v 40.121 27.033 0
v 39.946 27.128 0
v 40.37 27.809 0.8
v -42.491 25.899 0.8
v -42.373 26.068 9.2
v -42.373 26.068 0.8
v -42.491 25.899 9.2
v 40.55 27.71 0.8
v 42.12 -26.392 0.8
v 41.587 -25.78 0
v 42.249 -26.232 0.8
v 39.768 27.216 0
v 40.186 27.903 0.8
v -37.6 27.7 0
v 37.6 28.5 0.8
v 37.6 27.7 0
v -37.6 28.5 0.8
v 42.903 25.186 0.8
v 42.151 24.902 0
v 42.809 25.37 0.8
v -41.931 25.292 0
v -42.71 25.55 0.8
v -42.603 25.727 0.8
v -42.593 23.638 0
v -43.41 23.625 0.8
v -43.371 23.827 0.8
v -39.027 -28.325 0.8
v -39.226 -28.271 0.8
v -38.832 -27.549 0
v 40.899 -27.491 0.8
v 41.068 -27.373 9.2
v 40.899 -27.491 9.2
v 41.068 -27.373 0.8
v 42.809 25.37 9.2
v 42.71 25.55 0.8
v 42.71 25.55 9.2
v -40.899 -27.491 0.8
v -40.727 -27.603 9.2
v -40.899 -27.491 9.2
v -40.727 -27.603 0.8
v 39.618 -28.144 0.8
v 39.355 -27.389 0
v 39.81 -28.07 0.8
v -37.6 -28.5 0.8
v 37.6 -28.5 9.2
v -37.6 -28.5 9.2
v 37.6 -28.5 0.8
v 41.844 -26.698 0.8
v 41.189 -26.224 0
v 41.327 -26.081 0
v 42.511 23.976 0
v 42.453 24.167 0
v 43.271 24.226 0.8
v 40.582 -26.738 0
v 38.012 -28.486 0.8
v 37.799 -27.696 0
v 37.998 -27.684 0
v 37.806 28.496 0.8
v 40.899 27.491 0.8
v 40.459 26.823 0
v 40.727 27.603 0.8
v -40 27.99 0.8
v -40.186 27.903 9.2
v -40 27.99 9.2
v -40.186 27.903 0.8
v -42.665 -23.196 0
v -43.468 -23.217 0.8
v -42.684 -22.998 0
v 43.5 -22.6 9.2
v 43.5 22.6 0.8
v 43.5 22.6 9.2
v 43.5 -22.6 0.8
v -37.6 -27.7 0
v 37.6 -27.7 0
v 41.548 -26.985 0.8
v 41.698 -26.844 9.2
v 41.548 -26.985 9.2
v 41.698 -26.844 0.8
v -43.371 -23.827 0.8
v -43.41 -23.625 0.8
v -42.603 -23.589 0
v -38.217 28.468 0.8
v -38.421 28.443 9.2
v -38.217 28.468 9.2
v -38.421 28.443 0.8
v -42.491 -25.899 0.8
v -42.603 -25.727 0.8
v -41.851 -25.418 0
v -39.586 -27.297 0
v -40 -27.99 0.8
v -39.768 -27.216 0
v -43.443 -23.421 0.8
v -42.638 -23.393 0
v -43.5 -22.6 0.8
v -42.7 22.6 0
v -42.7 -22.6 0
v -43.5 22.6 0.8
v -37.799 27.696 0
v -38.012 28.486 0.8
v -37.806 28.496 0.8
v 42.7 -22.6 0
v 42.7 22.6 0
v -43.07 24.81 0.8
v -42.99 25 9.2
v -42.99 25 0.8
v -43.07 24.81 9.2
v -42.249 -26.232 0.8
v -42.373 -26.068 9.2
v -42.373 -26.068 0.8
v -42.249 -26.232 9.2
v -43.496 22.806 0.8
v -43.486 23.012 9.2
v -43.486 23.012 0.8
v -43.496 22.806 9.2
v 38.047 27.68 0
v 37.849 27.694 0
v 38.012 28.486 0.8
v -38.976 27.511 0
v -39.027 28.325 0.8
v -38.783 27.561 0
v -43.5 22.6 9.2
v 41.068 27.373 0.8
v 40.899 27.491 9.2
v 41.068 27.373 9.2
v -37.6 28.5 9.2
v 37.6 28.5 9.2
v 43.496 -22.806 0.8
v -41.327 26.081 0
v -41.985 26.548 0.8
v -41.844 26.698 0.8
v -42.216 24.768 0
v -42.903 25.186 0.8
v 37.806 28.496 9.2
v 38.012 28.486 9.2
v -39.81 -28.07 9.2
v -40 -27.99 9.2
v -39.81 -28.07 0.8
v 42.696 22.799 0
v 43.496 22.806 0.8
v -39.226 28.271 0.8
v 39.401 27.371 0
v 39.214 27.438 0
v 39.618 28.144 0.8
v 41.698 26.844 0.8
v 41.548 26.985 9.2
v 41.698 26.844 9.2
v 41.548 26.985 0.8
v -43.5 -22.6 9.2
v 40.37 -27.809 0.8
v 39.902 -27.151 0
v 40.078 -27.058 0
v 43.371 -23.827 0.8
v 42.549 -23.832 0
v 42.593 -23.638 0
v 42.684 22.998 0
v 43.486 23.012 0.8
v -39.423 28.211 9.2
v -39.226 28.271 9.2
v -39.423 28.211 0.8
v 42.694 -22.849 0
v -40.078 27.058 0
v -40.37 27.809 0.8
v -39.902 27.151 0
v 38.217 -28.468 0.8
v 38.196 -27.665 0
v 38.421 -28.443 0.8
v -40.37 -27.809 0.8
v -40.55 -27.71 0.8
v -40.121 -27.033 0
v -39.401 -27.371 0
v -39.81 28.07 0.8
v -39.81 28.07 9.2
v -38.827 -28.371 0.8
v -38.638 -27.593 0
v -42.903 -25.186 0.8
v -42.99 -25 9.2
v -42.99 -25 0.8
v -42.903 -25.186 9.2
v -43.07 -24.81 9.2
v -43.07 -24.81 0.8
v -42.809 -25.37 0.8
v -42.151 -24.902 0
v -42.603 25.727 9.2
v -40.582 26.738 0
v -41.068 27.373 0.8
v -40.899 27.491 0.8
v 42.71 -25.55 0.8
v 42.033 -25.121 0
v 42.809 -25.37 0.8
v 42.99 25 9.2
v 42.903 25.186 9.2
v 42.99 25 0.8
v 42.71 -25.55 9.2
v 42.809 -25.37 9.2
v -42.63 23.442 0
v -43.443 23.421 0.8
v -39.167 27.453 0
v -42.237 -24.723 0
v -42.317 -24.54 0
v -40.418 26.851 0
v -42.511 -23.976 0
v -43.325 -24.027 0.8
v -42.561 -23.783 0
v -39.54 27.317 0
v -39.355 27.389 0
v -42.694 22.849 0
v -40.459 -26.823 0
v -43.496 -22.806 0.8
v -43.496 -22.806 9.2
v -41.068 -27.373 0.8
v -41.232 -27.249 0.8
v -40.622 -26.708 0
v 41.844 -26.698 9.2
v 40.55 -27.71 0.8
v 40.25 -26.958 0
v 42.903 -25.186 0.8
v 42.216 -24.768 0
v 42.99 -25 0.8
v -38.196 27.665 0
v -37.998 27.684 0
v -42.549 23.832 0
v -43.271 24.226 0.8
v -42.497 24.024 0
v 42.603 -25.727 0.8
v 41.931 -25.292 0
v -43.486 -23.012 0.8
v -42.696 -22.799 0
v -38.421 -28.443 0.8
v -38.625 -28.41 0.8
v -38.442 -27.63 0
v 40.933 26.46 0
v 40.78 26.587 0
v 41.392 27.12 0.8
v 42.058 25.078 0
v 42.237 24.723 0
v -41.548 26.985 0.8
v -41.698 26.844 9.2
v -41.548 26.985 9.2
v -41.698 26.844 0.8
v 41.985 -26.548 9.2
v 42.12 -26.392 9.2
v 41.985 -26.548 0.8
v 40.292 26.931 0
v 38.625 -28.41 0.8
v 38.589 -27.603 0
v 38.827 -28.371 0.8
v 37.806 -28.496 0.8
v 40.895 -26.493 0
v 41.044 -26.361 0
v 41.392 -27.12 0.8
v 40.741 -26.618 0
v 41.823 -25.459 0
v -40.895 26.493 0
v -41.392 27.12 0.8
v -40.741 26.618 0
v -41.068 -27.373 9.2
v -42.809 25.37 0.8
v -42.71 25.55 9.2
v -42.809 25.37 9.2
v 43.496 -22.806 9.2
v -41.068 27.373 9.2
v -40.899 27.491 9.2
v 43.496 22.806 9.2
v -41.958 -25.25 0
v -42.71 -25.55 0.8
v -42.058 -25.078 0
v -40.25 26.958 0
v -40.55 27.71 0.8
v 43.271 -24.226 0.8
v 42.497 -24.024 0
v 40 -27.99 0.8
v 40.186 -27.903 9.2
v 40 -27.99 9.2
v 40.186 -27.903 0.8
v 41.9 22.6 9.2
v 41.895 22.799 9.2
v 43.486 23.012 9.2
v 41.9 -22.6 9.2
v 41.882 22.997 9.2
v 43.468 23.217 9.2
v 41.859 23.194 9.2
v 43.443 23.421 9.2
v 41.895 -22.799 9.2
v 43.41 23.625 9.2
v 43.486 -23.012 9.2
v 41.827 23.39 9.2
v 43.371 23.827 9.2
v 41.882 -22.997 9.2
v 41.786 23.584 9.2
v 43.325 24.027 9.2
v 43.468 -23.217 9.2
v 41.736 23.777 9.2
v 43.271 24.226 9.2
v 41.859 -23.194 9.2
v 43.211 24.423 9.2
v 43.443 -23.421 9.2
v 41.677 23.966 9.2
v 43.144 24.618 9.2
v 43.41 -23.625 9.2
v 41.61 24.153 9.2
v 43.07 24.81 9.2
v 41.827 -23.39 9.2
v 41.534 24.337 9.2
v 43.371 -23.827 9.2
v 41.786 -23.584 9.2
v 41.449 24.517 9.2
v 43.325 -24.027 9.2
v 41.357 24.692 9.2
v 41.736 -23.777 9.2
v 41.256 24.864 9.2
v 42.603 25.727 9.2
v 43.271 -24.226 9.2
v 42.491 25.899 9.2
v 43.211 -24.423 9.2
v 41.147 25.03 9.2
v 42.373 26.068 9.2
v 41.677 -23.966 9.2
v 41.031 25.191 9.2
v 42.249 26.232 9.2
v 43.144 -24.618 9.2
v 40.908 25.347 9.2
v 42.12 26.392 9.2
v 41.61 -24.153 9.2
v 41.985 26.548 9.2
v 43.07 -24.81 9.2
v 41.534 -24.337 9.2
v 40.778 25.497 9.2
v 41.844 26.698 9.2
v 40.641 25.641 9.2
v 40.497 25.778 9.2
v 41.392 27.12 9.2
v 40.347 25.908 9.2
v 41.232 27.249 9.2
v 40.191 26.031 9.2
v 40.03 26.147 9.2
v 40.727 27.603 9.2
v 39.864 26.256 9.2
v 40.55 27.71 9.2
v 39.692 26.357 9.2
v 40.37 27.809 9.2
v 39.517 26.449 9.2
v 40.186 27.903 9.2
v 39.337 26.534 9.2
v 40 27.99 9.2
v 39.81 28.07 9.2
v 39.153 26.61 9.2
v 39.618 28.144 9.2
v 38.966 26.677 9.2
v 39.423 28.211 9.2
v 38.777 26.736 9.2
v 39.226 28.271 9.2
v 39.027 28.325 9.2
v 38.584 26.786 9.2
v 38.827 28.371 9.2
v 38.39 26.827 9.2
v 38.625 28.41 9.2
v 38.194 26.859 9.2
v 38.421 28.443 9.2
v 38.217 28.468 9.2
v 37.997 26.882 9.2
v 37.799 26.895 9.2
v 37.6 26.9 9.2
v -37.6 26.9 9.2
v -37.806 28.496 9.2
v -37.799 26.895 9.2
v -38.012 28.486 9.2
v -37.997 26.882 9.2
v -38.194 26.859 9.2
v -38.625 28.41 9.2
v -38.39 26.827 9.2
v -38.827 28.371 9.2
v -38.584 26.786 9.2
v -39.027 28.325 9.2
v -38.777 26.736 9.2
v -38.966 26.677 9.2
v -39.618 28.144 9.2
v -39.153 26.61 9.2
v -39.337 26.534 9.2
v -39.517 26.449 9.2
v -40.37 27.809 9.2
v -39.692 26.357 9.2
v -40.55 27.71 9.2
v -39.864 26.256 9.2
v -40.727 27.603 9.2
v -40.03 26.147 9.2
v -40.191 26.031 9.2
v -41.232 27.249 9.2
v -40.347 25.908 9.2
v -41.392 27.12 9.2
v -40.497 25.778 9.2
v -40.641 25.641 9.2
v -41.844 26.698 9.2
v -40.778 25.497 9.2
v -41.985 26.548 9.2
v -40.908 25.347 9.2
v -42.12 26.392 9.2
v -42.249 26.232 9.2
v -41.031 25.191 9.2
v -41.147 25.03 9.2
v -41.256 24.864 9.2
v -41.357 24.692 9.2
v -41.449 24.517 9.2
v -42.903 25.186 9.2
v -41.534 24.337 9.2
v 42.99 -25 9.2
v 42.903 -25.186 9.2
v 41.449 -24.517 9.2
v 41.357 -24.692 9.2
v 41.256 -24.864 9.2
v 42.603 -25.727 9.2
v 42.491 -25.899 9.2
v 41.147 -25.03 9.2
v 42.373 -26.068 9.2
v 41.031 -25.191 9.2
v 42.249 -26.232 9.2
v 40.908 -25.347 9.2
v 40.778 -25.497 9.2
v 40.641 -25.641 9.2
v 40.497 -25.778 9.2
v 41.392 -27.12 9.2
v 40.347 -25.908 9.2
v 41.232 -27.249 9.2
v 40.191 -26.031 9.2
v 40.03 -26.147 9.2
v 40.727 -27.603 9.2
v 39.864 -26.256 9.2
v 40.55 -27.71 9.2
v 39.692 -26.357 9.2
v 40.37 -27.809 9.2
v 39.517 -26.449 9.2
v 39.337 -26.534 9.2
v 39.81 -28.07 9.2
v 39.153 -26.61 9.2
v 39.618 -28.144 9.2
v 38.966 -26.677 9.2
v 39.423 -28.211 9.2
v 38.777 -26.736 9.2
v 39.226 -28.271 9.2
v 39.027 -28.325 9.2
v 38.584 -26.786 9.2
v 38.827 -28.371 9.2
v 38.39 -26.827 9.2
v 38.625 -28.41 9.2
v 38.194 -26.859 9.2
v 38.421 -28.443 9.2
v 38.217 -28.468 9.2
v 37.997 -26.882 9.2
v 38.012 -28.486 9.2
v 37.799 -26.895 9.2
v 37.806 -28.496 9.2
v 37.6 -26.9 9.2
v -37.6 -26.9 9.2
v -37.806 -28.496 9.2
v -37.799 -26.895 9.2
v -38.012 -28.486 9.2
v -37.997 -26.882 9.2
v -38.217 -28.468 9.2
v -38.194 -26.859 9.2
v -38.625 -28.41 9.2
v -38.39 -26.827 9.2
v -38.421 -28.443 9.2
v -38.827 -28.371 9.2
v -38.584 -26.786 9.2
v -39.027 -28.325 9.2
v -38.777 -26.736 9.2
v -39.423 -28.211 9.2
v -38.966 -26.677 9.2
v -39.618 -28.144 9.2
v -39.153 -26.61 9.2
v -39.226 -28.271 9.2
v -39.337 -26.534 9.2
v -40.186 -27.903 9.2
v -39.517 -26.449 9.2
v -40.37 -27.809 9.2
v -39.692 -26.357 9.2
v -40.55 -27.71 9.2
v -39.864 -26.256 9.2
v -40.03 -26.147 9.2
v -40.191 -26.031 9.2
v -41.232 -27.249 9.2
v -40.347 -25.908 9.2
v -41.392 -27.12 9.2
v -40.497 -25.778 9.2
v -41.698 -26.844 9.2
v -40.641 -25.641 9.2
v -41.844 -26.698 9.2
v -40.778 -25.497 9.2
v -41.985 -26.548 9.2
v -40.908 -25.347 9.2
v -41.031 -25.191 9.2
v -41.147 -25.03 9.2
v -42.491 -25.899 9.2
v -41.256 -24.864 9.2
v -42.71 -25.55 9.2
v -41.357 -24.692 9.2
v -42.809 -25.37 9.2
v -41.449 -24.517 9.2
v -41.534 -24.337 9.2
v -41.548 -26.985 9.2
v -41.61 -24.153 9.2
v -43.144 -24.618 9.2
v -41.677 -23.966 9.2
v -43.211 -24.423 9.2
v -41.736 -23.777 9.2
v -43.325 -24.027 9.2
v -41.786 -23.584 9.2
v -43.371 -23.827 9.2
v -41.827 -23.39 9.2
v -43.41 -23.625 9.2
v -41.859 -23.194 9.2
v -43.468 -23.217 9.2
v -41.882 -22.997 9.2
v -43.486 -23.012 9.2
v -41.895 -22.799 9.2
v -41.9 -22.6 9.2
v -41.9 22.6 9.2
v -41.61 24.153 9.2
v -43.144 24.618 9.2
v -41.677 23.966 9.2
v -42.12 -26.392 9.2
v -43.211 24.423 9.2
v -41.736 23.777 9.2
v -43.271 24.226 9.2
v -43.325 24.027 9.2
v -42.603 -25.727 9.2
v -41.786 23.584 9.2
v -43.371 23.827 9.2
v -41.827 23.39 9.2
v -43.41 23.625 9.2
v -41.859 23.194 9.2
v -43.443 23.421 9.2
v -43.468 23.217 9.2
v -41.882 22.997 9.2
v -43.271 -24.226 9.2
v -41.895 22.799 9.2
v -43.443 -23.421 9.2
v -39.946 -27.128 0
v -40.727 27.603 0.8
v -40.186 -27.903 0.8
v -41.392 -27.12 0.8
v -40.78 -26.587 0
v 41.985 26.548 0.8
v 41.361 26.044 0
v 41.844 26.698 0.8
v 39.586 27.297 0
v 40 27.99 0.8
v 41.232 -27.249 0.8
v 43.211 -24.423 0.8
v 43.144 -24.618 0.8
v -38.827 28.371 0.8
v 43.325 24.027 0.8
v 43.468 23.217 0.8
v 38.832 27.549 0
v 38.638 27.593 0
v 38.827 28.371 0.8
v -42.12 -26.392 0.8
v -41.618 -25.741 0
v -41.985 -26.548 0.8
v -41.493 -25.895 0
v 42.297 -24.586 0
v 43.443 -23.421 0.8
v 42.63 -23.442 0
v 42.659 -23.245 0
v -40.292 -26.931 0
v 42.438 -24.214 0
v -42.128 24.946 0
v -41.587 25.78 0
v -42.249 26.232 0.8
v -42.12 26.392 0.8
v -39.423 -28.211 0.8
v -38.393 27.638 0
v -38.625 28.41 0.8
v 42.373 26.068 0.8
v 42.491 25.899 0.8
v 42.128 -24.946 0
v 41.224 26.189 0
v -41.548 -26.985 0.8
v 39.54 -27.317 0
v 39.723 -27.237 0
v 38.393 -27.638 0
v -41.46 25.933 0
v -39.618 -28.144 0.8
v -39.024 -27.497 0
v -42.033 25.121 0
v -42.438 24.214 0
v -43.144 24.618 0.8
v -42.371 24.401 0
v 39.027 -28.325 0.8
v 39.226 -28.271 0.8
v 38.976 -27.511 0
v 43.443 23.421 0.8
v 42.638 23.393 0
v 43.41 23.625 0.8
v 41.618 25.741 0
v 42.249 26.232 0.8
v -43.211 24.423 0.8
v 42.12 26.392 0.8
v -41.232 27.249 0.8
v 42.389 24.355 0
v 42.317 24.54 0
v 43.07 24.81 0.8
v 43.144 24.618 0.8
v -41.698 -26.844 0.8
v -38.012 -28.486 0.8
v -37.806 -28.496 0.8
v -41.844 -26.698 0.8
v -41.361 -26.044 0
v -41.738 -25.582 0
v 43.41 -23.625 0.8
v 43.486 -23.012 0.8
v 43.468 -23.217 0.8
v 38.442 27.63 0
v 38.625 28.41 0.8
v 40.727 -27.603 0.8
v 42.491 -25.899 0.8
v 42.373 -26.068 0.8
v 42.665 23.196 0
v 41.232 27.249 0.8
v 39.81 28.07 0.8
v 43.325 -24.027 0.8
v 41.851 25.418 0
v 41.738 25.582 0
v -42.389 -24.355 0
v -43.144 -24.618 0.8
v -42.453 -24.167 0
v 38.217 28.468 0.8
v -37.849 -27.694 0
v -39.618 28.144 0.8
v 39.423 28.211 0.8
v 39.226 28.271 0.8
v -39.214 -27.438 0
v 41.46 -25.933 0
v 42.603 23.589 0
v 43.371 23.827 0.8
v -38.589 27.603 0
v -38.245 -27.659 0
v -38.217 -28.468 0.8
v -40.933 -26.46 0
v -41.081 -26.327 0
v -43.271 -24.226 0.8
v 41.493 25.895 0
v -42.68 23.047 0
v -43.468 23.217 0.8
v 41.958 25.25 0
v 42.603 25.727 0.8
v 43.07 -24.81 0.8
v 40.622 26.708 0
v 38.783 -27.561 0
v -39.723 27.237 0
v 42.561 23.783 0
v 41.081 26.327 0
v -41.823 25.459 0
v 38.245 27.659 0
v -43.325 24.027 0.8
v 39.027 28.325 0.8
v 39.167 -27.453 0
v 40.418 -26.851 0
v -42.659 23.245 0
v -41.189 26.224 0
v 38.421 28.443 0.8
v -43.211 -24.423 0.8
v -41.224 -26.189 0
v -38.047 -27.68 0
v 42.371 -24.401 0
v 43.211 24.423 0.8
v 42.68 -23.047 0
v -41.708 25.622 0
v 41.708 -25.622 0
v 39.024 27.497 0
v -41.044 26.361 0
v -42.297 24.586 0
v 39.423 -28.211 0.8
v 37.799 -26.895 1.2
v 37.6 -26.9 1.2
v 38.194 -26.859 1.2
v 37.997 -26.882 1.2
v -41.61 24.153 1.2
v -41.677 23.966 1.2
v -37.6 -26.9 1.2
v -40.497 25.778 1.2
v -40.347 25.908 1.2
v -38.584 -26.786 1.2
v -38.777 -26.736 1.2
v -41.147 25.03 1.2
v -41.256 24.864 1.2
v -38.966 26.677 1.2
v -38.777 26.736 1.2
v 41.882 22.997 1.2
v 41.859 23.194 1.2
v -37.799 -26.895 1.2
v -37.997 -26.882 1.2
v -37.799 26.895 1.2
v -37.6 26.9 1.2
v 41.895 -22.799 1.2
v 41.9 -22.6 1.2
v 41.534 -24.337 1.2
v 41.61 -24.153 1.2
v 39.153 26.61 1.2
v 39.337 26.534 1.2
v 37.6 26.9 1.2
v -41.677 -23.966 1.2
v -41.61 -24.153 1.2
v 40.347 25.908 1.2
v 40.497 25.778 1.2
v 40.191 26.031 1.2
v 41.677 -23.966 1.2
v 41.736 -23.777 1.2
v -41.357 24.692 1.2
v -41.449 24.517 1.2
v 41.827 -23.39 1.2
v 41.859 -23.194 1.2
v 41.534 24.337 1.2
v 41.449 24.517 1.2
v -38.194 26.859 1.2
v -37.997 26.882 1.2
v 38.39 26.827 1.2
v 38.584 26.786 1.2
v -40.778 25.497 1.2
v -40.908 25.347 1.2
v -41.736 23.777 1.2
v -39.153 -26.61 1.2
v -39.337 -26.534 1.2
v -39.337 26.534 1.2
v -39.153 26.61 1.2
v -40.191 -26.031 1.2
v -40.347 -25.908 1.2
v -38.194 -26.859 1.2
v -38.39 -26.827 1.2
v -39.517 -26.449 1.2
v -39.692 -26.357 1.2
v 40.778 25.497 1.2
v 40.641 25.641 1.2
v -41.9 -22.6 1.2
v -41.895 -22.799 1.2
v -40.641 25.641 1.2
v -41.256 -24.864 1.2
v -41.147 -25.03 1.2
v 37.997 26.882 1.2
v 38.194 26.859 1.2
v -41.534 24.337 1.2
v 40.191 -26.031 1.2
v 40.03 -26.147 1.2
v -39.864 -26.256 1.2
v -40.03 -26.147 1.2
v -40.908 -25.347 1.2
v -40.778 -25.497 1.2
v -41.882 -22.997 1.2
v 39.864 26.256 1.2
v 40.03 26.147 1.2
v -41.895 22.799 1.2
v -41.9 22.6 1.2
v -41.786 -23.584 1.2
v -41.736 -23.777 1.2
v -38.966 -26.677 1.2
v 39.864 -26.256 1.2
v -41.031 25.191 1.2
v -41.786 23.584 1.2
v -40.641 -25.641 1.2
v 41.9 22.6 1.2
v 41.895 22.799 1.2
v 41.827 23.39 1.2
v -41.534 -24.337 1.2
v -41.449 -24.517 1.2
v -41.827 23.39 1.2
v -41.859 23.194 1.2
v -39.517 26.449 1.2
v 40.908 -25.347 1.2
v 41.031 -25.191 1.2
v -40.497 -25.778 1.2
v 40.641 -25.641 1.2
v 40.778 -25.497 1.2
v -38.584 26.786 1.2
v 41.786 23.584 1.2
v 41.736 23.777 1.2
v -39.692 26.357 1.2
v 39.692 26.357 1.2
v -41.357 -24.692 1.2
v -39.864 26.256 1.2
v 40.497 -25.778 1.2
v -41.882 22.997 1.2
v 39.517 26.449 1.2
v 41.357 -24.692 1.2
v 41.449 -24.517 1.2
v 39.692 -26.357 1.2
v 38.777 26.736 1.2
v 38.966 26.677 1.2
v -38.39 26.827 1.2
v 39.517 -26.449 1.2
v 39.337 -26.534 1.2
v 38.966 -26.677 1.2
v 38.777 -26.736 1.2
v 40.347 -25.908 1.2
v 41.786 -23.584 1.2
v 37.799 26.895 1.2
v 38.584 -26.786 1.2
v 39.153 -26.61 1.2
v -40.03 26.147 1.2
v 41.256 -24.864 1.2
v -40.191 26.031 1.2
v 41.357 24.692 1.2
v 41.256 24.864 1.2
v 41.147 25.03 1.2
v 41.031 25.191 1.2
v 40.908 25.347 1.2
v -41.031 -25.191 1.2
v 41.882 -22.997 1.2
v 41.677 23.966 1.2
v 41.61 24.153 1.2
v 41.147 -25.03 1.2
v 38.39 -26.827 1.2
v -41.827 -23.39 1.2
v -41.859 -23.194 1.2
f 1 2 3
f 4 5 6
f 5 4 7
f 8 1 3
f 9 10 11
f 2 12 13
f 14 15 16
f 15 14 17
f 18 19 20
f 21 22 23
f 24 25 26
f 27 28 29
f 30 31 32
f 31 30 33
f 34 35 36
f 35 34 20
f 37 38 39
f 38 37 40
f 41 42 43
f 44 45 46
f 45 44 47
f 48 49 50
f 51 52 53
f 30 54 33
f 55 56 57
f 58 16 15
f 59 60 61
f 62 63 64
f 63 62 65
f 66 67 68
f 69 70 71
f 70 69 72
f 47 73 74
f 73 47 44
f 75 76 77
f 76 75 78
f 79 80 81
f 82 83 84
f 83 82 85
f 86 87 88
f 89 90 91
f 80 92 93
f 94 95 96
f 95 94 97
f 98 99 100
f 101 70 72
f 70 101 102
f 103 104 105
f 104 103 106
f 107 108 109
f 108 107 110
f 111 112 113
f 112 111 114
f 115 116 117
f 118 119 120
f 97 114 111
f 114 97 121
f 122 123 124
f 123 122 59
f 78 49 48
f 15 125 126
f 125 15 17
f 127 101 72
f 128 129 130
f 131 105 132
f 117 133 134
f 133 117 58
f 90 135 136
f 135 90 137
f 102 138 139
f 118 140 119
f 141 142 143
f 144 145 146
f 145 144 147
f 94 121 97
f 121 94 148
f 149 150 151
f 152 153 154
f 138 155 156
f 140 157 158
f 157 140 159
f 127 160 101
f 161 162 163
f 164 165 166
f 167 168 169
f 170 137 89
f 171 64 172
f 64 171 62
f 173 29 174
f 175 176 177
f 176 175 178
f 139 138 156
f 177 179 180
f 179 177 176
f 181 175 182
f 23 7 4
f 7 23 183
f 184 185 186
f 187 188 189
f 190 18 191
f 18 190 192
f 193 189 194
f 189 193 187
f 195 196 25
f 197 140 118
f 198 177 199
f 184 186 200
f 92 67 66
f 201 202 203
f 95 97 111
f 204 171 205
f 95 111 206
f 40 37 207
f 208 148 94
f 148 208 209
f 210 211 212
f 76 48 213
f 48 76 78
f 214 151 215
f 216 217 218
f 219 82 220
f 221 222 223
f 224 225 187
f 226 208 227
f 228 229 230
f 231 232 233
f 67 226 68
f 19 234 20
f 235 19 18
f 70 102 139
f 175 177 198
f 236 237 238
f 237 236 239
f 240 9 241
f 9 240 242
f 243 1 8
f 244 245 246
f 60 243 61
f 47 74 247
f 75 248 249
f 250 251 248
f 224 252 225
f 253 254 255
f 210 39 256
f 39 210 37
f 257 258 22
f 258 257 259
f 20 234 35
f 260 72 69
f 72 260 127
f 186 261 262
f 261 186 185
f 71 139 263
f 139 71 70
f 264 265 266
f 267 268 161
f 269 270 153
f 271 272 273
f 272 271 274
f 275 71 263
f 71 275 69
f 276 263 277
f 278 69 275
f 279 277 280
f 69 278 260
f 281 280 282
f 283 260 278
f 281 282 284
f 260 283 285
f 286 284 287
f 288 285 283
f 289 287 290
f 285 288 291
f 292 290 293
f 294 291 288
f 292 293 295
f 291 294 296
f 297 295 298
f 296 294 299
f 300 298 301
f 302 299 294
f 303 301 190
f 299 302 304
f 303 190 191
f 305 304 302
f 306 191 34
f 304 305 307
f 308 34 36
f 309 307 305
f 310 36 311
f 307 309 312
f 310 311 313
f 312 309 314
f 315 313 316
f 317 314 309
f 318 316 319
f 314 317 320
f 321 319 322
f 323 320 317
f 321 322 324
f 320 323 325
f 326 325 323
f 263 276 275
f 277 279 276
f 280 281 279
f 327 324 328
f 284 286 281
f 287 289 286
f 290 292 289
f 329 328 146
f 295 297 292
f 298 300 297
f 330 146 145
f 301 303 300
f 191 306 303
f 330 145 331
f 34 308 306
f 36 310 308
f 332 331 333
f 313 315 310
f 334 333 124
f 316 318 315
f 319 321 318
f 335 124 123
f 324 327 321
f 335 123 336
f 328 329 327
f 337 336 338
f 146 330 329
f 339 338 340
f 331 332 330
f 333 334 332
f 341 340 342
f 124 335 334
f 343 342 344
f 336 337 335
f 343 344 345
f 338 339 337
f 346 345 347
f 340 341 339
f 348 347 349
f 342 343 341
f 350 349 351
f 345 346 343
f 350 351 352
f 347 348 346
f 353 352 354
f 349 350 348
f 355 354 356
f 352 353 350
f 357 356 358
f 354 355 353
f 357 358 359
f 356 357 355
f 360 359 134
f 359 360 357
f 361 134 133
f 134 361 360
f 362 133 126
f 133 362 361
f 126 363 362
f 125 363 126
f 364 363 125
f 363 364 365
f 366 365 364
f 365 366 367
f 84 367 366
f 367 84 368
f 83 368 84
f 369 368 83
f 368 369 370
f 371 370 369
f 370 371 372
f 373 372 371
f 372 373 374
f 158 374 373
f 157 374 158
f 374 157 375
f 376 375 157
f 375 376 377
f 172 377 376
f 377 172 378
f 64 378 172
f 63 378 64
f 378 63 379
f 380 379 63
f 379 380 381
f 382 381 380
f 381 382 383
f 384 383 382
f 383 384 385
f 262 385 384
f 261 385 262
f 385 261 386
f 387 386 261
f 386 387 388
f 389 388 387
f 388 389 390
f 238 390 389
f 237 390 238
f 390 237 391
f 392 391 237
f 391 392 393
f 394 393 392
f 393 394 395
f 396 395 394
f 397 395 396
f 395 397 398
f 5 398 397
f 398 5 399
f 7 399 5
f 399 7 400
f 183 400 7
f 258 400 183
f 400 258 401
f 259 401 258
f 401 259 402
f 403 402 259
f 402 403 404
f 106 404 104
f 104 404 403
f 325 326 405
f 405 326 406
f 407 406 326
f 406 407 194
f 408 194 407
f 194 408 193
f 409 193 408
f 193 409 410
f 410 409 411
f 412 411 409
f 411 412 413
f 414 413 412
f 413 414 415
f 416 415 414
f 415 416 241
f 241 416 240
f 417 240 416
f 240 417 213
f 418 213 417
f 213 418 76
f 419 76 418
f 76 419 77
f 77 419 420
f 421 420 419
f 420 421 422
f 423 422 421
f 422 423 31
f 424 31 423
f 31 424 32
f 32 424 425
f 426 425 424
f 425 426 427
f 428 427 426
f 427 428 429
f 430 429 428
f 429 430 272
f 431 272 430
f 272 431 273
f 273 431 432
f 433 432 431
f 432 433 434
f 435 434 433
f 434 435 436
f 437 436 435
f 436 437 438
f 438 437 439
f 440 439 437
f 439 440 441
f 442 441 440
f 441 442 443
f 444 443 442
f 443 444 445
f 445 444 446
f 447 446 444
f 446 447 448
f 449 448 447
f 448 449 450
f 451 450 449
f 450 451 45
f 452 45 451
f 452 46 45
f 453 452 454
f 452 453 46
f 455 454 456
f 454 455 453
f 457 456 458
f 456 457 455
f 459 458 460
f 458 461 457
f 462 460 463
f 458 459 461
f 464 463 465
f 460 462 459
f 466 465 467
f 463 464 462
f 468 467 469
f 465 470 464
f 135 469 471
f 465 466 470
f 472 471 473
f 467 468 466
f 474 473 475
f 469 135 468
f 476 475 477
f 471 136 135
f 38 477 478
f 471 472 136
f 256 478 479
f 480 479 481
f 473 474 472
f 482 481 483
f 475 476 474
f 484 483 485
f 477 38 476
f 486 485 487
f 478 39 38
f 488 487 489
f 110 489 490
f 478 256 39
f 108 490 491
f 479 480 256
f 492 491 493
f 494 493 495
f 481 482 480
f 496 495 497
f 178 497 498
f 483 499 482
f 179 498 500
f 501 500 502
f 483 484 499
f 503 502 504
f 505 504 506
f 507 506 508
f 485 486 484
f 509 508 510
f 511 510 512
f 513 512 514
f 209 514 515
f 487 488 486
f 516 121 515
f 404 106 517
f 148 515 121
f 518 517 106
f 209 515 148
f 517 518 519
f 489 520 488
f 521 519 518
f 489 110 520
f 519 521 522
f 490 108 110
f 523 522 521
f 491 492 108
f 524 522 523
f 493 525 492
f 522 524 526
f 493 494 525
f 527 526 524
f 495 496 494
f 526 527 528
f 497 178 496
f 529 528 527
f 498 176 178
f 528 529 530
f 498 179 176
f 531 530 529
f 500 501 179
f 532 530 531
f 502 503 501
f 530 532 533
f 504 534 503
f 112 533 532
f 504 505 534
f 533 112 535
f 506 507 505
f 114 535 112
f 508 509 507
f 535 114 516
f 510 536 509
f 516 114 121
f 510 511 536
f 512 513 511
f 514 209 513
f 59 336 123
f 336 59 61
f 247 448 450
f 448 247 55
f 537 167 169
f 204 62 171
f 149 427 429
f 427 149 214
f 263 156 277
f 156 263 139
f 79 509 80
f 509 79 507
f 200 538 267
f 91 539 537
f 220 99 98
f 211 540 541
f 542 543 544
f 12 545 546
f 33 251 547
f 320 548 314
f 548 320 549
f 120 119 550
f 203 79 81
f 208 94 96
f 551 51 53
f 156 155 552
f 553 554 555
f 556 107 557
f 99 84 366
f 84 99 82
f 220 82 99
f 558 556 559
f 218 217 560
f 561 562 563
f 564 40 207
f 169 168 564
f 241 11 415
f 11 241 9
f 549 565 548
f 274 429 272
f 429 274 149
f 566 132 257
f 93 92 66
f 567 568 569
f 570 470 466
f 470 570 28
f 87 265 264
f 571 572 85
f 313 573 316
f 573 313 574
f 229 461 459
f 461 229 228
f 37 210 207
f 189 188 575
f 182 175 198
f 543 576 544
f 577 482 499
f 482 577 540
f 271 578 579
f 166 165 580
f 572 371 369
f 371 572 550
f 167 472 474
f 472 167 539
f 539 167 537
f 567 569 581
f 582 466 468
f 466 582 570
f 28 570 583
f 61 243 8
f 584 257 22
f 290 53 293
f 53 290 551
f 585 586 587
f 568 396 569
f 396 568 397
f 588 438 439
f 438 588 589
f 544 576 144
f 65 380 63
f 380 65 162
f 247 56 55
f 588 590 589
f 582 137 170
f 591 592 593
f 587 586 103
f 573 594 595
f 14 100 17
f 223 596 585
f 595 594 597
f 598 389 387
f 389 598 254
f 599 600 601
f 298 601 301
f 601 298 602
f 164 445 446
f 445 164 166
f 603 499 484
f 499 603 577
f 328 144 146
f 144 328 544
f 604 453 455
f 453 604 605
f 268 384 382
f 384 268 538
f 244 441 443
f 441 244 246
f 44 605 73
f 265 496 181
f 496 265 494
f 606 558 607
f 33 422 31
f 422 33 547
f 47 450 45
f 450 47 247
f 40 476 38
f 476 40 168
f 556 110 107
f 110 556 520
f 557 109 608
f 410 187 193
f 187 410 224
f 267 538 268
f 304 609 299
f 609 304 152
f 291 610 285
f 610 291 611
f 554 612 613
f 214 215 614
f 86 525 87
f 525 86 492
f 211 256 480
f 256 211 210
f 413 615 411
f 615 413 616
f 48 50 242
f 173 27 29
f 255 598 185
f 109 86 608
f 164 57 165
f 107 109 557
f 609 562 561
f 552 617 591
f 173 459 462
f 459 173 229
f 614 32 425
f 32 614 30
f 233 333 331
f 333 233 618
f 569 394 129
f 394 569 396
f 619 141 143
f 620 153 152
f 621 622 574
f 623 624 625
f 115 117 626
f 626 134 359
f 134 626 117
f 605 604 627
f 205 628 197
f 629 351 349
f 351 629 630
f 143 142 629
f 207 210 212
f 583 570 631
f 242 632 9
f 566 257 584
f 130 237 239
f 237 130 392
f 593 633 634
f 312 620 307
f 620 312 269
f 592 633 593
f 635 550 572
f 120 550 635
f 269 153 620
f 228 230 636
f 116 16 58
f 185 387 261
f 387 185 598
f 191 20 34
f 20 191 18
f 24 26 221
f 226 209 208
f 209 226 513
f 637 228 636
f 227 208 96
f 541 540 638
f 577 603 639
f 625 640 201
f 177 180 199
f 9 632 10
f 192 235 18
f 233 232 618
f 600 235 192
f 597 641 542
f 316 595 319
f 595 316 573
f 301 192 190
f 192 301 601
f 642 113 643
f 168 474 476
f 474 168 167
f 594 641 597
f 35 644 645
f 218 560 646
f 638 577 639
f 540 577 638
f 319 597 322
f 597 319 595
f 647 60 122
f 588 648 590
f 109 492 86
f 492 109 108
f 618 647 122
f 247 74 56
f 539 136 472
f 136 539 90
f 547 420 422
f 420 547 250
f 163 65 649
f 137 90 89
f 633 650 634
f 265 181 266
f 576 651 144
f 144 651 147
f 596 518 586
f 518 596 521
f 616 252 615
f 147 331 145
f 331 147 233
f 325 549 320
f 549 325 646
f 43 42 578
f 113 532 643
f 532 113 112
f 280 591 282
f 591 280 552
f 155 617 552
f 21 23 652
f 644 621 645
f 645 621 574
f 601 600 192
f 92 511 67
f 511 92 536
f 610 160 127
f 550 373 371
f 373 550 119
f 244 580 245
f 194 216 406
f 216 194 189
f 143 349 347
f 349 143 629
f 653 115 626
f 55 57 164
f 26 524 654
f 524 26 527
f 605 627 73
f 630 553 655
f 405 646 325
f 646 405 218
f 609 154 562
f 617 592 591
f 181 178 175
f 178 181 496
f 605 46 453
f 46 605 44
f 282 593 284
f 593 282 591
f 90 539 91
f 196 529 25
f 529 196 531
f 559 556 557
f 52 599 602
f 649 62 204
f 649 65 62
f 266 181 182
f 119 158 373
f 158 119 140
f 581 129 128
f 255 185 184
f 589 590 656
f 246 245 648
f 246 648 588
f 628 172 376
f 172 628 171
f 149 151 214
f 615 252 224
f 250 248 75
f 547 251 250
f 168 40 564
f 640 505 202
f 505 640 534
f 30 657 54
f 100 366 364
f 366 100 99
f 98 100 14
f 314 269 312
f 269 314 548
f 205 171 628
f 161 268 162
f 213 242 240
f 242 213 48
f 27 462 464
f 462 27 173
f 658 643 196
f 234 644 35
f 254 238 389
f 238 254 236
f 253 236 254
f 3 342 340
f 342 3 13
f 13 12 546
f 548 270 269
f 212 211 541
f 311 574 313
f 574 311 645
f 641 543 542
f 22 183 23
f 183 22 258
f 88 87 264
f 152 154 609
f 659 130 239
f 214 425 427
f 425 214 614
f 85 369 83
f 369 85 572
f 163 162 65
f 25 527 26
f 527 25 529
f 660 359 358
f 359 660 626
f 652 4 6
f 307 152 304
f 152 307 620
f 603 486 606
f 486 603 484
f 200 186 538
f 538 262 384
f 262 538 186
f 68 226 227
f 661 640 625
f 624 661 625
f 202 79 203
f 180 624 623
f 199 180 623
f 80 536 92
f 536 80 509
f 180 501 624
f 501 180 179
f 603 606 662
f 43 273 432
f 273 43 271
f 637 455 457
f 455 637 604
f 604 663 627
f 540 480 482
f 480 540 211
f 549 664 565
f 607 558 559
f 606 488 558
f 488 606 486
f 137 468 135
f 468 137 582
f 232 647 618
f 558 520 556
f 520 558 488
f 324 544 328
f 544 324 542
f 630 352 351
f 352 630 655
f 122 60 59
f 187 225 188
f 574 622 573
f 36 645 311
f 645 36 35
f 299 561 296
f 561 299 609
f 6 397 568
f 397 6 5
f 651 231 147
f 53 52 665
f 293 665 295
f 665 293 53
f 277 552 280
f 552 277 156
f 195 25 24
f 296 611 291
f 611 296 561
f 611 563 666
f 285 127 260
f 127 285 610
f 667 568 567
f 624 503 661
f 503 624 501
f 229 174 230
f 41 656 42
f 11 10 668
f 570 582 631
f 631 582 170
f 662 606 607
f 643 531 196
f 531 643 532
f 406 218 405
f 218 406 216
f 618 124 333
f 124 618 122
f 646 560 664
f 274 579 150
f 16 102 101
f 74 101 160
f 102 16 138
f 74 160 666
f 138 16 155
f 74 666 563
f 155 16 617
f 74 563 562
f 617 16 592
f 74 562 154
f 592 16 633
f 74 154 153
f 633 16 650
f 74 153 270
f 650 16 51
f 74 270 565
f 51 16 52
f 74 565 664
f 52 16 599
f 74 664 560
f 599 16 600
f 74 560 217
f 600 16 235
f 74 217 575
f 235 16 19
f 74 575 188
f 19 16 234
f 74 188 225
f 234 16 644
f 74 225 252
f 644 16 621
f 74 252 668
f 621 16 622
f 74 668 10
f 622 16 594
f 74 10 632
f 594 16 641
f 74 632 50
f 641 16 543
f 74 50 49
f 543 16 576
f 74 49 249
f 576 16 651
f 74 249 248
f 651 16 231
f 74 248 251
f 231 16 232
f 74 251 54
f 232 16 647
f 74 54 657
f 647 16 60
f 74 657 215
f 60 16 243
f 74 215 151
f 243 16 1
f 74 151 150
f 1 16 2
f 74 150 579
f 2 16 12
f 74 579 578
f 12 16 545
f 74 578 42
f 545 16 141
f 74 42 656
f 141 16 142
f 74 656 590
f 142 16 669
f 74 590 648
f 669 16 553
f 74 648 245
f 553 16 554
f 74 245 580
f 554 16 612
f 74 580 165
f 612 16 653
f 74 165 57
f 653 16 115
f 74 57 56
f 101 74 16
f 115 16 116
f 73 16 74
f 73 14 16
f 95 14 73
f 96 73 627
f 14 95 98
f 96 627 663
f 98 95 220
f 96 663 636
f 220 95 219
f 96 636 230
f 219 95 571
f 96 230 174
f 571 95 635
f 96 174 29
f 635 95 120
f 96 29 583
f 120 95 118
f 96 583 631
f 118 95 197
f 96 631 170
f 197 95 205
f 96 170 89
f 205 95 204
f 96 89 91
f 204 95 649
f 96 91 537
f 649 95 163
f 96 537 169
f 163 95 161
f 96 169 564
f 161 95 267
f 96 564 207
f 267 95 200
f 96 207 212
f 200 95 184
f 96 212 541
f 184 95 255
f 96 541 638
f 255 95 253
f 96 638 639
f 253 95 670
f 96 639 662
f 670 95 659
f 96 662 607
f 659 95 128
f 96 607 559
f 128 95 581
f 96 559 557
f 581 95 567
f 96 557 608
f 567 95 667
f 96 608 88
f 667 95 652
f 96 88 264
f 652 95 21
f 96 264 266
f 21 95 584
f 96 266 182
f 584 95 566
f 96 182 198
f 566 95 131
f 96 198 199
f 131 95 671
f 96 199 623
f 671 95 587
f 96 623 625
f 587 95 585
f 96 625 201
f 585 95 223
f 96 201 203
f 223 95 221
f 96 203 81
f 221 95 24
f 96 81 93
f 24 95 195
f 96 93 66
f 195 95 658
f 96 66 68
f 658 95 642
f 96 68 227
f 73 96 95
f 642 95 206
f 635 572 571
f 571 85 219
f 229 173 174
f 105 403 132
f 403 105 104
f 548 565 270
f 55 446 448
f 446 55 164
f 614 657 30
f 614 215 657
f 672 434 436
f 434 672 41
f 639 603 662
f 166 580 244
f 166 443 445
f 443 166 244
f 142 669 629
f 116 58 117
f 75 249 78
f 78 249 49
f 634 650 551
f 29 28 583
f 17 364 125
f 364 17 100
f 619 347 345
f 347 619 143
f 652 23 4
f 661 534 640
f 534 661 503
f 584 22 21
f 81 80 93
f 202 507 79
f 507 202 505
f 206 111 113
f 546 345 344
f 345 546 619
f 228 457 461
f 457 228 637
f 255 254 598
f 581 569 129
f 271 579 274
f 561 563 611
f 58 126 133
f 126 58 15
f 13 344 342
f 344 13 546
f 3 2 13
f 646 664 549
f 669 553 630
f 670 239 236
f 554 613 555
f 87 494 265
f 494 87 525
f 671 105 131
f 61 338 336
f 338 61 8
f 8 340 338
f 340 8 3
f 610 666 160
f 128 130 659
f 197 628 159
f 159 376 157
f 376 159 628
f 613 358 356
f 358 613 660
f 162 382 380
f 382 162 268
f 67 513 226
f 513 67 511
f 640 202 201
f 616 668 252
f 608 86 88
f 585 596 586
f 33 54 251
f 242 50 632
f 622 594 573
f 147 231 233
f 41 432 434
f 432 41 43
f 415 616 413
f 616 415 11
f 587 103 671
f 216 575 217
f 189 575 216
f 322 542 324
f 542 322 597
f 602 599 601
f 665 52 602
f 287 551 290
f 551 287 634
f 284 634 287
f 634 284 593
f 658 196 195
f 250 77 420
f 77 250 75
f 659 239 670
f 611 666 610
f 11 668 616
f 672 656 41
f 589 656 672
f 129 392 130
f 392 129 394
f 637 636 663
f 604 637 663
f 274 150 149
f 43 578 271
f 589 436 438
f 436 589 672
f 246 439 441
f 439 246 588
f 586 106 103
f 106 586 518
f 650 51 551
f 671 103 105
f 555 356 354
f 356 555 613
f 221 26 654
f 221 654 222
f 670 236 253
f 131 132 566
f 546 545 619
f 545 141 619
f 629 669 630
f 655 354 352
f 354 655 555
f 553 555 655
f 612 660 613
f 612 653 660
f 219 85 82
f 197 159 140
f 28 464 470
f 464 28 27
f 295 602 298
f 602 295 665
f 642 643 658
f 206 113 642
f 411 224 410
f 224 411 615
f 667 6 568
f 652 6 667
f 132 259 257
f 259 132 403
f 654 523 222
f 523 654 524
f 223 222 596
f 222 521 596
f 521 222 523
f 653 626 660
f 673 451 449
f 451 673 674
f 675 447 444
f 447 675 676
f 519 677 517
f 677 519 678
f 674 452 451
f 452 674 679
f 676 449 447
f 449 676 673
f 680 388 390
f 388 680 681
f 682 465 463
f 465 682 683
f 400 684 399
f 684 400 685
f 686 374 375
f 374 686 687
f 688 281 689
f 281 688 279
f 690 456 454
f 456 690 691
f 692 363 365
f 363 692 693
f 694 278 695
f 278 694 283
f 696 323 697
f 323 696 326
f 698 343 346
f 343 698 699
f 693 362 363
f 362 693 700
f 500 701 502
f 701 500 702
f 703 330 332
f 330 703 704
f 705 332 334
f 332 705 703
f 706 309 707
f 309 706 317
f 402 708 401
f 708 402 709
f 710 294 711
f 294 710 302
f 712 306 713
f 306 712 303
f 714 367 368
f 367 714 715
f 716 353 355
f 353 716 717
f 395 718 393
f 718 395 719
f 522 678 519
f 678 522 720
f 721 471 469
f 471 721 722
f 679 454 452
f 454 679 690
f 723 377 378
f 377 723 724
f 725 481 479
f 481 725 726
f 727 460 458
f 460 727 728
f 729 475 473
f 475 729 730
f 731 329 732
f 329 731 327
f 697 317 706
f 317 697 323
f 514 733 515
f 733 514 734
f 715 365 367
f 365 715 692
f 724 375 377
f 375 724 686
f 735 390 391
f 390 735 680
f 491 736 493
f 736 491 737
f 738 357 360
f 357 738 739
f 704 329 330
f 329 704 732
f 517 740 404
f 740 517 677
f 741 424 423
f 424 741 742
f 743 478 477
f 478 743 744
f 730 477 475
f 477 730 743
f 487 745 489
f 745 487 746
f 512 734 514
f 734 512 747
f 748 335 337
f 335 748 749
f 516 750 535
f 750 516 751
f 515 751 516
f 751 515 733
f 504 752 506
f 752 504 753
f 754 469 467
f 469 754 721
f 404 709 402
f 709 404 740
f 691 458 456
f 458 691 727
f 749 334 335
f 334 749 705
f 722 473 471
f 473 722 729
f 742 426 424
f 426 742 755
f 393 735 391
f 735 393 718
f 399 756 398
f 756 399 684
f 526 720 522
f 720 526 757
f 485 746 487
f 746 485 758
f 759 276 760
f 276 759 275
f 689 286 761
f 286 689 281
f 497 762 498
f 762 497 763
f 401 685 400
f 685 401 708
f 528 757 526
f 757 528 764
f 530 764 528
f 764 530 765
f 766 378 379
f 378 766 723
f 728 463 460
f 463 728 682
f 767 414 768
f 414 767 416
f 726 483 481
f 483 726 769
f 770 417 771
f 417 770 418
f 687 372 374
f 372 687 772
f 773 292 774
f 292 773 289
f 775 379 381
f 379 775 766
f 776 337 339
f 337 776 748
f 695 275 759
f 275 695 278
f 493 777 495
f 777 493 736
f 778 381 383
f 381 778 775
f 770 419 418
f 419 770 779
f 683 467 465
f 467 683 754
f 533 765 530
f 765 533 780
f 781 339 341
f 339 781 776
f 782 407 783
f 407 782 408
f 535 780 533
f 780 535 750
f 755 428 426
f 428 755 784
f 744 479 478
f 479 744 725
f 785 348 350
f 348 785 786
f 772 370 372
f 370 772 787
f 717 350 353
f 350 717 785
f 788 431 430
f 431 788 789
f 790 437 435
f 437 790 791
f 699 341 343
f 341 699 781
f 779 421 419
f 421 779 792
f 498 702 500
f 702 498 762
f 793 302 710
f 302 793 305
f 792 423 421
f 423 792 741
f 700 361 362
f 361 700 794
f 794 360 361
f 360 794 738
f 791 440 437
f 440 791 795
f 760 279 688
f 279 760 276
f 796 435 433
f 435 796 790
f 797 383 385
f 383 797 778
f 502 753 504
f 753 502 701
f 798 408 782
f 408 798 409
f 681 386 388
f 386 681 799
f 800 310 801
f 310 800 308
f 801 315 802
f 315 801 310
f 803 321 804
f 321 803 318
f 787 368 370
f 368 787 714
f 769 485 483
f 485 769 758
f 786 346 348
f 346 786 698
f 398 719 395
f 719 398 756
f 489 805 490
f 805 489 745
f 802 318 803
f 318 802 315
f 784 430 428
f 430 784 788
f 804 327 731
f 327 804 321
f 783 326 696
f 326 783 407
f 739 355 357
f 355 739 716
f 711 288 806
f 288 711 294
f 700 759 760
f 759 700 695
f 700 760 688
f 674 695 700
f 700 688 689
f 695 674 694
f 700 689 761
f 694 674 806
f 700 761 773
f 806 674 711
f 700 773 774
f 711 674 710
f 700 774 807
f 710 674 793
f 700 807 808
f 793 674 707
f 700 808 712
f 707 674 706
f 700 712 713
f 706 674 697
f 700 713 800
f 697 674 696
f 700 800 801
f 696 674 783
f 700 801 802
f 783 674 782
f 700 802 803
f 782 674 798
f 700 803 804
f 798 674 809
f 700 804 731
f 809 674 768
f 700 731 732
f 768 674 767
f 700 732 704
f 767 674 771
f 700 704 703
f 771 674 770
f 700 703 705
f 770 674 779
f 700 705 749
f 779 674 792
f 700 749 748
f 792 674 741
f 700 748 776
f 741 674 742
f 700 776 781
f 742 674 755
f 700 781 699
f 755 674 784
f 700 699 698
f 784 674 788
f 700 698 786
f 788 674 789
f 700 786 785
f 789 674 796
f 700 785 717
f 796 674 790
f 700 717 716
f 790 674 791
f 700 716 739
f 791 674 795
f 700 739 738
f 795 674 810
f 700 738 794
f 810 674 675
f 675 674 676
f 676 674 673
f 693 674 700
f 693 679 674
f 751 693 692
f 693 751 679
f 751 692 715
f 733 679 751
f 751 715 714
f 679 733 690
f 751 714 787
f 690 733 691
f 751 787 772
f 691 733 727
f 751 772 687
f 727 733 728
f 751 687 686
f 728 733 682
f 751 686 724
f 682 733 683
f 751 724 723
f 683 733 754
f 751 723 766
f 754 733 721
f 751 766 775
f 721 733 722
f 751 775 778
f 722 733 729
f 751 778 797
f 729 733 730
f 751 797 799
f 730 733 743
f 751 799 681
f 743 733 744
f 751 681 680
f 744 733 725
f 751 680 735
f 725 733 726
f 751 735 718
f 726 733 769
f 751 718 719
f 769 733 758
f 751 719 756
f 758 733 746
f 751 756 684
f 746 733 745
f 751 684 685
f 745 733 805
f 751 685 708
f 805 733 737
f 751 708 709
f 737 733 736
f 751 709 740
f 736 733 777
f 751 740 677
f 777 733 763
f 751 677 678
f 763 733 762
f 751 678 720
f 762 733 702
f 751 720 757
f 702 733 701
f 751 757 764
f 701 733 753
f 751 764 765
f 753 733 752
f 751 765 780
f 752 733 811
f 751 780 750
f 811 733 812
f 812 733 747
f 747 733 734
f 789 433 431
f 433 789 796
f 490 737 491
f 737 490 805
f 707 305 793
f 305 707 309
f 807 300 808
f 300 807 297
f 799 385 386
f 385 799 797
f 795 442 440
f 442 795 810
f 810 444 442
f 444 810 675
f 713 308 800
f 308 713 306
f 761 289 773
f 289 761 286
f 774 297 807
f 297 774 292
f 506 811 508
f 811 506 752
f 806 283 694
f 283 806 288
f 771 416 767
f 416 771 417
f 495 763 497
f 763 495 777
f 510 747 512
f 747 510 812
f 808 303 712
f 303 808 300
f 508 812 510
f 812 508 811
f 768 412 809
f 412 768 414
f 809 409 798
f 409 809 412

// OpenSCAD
// file: ../lib/profiles.scad
// Shared 2D outlines and prisms. Every module takes its dimensions as
// named arguments — nothing in here reads params.scad, because a `use`d
// file's own includes do NOT see the caller's -D overrides. The caller
// (a part file) includes params.scad and passes the numbers in.

eps = 0.01;

// Rounded rectangle, centred. The double offset rounds convex corners.
module rounded_rect(size = [10, 10], r = 1) {
    rr = max(r, 0);
    offset(r = rr) offset(delta = -rr) square(size, center = true);
}

// Rounded prism, z = 0 on the bed, with a 45° chamfer on the bed edge
// (self-supporting, unlike a downward fillet, and it eats elephant foot).
module chamfered_prism(size = [10, 10], r = 1, h = 10, chamfer = 0.8) {
    c = min(chamfer, h / 2);
    hull() {
        linear_extrude(eps) rounded_rect(size = size - [2*c, 2*c], r = r - c);
        translate([0, 0, c]) linear_extrude(h - c) rounded_rect(size = size, r = r);
    }
}

// Self-test: opening this file directly shows a demo; importers see nothing.
if ($preview && $parent_modules == 0) chamfered_prism(size = [40, 25], r = 5, h = 12);
// file: ../params.scad
// <Project name> — one line on what this is and who/what it is for.
// Single source of truth. Units: mm. Measure once, edit this file, `make`.
//
// Frame of reference (every part): z = 0 on the print bed, XY centred.
// Provenance on every real-world number: MEASURED / PLACEHOLDER / UNVERIFIED.

$fa = $preview ? 12 : 2;     // coarse preview, fine render
$fs = $preview ? 2.0 : 0.2;
eps = 0.01;                  // boolean-overlap fudge: every cutter overshoots by this

/* [Printer — EDIT FOR YOUR MACHINE] */
BED_X = 220; BED_Y = 220; BED_Z = 250;   // ⚠ PLACEHOLDER — your build volume
nozzle  = 0.4;
layer_h = 0.2;

/* [Tray interior — MEASURE THESE] */
inner_w = 80;    // ⚠ PLACEHOLDER — the thing that has to fit inside
inner_d = 50;    // ⚠ PLACEHOLDER
inner_h = 30;    // ⚠ PLACEHOLDER
wall    = 1.6;   // 4 perimeters; tune stiffness here first
floor_t = 1.2;   // 6 layers
corner_r = 4;    // vertical-edge radius; the lid derives its own from this
bottom_chamfer = 0.8;   // 45°, absorbs elephant foot so outer dims stay honest

/* [Lid fit — UNVERIFIED, the gauge decides] */
lid_clear = 0.3;   // ⚠ UNVERIFIED per side — `make gauge` sweeps 0.2..0.6
lid_h     = 8;     // skirt height
lid_top_t = 1.2;

/* [Hidden] */
outer_w = inner_w + 2*wall;
outer_d = inner_d + 2*wall;
outer_h = inner_h + floor_t;
lid_inner_w = outer_w + 2*lid_clear;
lid_inner_d = outer_d + 2*lid_clear;
lid_outer_w = lid_inner_w + 2*wall;
lid_outer_d = lid_inner_d + 2*wall;
lid_outer_h = lid_top_t + lid_h;
// main file
// Lid: slips over the tray. Prints as rendered — top face on the bed, so
// the chamfer lands on the lid's visible top edge. No support.
include <../params.scad>
use <../lib/profiles.scad>

assert(lid_outer_w <= BED_X && lid_outer_d <= BED_Y,
       str("lid exceeds bed: ", lid_outer_w, " x ", lid_outer_d));
echo(str("lid outer: ", lid_outer_w, " x ", lid_outer_d, " x ", lid_outer_h,
         "   clearance/side: ", lid_clear));

// Everything the gauge sweeps is an argument: a caller's -D override only
// reaches this module through its arguments, never through params.scad
// (see lib/profiles.scad for why).
module lid(clear = lid_clear, h = lid_h, label = "") {
    iw = outer_w + 2*clear;  id = outer_d + 2*clear;
    ow = iw + 2*wall;        od = id + 2*wall;
    difference() {
        chamfered_prism(size = [ow, od], r = corner_r + clear + wall,
                        h = lid_top_t + h, chamfer = bottom_chamfer);
        translate([0, 0, lid_top_t])
            linear_extrude(h + eps)
                rounded_rect(size = [iw, id], r = corner_r + clear);
        // label engraved into the bed face (prints as a recess in layer 1)
        if (label != "")
            translate([0, 0, -eps])
                linear_extrude(2*layer_h + eps)
                    mirror([1, 0, 0]) text(label, size = 5, halign = "center", valign = "center");
    }
}

lid();
